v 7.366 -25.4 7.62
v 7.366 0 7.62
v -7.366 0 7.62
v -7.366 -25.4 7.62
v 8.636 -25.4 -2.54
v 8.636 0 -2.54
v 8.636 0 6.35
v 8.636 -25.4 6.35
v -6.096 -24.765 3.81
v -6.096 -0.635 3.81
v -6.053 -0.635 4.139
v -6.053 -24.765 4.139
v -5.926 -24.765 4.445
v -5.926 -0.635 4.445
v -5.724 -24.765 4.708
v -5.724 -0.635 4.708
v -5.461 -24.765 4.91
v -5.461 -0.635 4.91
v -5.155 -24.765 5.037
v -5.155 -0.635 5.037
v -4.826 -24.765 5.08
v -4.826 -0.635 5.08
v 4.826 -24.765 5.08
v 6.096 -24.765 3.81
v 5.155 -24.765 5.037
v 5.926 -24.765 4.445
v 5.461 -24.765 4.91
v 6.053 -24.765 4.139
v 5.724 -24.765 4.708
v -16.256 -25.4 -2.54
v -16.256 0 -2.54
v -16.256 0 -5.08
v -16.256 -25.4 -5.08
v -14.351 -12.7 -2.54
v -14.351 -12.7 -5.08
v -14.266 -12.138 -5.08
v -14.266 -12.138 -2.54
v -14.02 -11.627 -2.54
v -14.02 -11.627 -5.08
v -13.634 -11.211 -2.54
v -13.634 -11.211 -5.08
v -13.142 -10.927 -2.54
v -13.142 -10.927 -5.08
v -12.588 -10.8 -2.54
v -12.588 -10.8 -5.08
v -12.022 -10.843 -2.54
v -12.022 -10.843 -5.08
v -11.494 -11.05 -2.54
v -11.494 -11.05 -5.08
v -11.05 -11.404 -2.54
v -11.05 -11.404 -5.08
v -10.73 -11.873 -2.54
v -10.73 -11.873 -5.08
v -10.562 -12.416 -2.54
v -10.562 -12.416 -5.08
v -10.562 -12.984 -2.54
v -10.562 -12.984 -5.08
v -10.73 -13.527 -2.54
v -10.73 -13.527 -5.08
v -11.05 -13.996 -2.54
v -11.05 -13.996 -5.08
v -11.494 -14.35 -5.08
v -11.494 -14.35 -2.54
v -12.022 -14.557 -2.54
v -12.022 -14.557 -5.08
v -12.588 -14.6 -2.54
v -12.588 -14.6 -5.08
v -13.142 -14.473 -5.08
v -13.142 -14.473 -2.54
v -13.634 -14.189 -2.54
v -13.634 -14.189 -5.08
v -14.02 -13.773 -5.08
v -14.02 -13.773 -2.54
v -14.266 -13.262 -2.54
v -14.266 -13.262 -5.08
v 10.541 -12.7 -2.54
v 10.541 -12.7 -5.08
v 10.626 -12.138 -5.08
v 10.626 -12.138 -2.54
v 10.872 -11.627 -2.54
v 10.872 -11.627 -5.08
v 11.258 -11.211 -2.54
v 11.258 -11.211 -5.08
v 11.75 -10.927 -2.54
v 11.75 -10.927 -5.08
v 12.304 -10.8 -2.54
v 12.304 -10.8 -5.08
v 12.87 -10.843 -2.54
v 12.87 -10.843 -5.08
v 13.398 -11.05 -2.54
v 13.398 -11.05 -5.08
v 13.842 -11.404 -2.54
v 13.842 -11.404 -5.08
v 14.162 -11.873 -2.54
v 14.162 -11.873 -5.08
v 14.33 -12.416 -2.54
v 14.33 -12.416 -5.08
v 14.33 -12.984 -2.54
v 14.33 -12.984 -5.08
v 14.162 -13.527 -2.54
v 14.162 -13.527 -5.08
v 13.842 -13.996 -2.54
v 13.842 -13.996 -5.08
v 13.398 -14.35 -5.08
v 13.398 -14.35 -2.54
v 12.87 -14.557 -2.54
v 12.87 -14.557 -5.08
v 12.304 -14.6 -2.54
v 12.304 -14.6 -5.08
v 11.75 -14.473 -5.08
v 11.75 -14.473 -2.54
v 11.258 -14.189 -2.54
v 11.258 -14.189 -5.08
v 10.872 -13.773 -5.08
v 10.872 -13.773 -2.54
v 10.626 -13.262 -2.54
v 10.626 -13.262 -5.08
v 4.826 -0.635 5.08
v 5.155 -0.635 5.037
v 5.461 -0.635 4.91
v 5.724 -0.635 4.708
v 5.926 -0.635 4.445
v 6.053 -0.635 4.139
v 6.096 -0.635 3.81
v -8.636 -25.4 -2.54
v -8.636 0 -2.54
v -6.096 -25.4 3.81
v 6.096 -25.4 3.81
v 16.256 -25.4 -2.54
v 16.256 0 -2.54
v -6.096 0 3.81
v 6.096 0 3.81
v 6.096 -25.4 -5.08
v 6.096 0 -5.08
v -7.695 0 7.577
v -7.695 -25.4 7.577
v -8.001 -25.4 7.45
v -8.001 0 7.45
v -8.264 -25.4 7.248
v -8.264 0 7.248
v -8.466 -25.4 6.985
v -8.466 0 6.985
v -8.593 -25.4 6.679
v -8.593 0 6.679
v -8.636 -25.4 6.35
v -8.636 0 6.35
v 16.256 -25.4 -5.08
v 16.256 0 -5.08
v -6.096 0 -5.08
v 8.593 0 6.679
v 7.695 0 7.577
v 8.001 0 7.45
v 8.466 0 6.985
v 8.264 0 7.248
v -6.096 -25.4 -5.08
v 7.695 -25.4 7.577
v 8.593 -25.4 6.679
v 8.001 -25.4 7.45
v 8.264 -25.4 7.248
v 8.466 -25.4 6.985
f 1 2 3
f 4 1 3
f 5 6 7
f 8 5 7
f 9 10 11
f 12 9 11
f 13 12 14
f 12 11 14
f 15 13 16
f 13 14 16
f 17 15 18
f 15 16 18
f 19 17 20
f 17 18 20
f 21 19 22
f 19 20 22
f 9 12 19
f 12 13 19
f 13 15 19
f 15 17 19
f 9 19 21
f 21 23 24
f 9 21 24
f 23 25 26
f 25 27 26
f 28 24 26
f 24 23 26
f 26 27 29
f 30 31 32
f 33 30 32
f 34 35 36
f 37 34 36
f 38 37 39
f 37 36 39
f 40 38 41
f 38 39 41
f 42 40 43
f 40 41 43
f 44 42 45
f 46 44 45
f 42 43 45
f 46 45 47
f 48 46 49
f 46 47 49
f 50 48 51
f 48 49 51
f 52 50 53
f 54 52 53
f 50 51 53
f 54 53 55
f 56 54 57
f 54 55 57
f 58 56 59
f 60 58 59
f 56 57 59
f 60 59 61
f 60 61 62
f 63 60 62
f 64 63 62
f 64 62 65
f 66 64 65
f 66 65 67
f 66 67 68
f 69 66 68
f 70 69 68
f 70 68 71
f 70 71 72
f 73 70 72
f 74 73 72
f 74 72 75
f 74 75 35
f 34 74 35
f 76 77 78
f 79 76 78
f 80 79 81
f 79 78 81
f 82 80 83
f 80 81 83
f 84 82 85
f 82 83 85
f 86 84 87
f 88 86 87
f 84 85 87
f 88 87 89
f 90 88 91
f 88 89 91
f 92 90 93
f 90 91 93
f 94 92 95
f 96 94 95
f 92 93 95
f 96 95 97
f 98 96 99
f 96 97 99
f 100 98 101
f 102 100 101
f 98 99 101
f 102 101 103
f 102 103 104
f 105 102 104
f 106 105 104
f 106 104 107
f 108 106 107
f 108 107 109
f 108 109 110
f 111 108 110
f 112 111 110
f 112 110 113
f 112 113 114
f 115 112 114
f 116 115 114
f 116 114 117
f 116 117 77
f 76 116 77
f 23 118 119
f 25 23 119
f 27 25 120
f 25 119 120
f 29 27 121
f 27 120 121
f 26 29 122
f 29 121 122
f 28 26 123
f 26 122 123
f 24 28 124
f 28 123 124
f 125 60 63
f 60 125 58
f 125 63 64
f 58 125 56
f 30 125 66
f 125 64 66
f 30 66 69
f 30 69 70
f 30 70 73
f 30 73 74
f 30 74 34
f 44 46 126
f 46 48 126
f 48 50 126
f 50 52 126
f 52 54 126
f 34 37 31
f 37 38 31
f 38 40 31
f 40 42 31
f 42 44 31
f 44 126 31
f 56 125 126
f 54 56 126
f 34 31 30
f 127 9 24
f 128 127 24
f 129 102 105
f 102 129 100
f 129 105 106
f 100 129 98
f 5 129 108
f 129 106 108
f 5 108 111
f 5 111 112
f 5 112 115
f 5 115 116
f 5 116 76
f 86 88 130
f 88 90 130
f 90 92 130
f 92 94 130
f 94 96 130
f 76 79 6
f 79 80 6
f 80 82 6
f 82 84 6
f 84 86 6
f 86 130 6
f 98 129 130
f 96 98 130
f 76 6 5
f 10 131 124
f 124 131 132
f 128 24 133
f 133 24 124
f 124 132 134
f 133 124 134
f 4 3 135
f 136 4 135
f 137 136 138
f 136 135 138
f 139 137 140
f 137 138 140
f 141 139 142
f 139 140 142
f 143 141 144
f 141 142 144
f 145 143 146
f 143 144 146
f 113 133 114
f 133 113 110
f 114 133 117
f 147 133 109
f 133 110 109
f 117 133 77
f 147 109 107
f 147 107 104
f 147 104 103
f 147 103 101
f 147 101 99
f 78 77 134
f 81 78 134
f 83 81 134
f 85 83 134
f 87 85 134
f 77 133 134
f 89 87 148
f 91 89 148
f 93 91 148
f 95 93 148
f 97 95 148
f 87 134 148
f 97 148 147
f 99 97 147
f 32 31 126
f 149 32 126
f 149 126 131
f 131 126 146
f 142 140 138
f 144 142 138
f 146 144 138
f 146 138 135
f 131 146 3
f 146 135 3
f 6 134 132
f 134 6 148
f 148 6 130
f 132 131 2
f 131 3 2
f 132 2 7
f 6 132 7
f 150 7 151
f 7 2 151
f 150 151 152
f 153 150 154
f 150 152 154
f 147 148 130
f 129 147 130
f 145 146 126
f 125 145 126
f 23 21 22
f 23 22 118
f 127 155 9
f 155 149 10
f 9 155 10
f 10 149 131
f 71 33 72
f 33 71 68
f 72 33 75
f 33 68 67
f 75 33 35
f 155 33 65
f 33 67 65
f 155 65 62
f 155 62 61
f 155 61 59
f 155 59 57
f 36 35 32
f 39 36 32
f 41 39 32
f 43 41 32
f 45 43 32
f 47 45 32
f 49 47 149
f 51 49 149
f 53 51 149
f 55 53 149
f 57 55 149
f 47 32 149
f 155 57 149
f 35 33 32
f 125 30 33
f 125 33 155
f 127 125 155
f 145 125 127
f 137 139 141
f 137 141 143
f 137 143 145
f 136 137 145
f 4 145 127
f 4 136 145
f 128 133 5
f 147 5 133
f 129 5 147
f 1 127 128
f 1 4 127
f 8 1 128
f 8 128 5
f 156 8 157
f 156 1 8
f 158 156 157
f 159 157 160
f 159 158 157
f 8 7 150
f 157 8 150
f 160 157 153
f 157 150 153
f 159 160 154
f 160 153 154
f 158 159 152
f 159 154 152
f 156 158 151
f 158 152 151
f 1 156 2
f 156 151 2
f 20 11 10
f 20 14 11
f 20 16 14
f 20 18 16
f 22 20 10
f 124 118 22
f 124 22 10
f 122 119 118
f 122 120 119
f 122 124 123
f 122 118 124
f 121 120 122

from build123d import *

# Parameters (mm, degrees)
F2_DEPTH = 25.4
F3_W     = 14.732
F3_H     = 0.635
F4_DEPTH = 3.81
F6_DEPTH = 3.81
F7_D     = 3.81


# Not quite as in the source:
# - a feature of the source that left no trace in its solid (it failed there, or was rolled back) is left out
# - a feature names something its author has since deleted; it is built from what else it names


with BuildPart() as f2:
    # F1 (on Front) → F2 (new body)
    with BuildSketch(Plane.XZ):
        with BuildLine():
            Line((-4.826, 5.08), (4.826, 5.08))
            ThreePointArc((4.826, 5.08), (5.7240256121, 4.7080256121), (6.096, 3.81))
            Line((6.096, 3.81), (6.096, -5.08))
            Line((6.096, -5.08), (16.256, -5.08))
            Line((16.256, -5.08), (16.256, -2.54))
            Line((16.256, -2.54), (8.636, -2.54))
            Line((8.636, -2.54), (8.636, 6.35))
            ThreePointArc((8.636, 6.35), (8.2640256121, 7.2480256121), (7.366, 7.62))
            Line((7.366, 7.62), (-7.366, 7.62))
            ThreePointArc((-7.366, 7.62), (-8.2640256121, 7.2480256121), (-8.636, 6.35))
            Line((-8.636, 6.35), (-8.636, -2.54))
            Line((-8.636, -2.54), (-16.256, -2.54))
            Line((-16.256, -2.54), (-16.256, -5.08))
            Line((-16.256, -5.08), (-6.096, -5.08))
            Line((-6.096, -5.08), (-6.096, 3.81))
            ThreePointArc((-6.096, 3.81), (-5.7240256121, 4.7080256121), (-4.826, 5.08))
        make_face()
    extrude(amount=F2_DEPTH)

    # F3 (on face) → F4 (join)
    with BuildSketch(Plane.XY.offset(7.62)):
        with Locations((0, -0.3175)):
            Rectangle(F3_W, F3_H)
    extrude(amount=-F4_DEPTH)

    # F3 (on face) → F6 (join)
    with BuildSketch(Plane.XY.offset(7.62)):
        with Locations((0, -25.0825)):
            Rectangle(F3_W, F3_H)
    extrude(amount=-F6_DEPTH)

    # F7 (through all)
    with Locations(Plane.XY.offset(-2.54)):
        with Locations((-12.446, -12.7), (12.446, -12.7)):
            Hole(F7_D / 2)


solid = f2.part
